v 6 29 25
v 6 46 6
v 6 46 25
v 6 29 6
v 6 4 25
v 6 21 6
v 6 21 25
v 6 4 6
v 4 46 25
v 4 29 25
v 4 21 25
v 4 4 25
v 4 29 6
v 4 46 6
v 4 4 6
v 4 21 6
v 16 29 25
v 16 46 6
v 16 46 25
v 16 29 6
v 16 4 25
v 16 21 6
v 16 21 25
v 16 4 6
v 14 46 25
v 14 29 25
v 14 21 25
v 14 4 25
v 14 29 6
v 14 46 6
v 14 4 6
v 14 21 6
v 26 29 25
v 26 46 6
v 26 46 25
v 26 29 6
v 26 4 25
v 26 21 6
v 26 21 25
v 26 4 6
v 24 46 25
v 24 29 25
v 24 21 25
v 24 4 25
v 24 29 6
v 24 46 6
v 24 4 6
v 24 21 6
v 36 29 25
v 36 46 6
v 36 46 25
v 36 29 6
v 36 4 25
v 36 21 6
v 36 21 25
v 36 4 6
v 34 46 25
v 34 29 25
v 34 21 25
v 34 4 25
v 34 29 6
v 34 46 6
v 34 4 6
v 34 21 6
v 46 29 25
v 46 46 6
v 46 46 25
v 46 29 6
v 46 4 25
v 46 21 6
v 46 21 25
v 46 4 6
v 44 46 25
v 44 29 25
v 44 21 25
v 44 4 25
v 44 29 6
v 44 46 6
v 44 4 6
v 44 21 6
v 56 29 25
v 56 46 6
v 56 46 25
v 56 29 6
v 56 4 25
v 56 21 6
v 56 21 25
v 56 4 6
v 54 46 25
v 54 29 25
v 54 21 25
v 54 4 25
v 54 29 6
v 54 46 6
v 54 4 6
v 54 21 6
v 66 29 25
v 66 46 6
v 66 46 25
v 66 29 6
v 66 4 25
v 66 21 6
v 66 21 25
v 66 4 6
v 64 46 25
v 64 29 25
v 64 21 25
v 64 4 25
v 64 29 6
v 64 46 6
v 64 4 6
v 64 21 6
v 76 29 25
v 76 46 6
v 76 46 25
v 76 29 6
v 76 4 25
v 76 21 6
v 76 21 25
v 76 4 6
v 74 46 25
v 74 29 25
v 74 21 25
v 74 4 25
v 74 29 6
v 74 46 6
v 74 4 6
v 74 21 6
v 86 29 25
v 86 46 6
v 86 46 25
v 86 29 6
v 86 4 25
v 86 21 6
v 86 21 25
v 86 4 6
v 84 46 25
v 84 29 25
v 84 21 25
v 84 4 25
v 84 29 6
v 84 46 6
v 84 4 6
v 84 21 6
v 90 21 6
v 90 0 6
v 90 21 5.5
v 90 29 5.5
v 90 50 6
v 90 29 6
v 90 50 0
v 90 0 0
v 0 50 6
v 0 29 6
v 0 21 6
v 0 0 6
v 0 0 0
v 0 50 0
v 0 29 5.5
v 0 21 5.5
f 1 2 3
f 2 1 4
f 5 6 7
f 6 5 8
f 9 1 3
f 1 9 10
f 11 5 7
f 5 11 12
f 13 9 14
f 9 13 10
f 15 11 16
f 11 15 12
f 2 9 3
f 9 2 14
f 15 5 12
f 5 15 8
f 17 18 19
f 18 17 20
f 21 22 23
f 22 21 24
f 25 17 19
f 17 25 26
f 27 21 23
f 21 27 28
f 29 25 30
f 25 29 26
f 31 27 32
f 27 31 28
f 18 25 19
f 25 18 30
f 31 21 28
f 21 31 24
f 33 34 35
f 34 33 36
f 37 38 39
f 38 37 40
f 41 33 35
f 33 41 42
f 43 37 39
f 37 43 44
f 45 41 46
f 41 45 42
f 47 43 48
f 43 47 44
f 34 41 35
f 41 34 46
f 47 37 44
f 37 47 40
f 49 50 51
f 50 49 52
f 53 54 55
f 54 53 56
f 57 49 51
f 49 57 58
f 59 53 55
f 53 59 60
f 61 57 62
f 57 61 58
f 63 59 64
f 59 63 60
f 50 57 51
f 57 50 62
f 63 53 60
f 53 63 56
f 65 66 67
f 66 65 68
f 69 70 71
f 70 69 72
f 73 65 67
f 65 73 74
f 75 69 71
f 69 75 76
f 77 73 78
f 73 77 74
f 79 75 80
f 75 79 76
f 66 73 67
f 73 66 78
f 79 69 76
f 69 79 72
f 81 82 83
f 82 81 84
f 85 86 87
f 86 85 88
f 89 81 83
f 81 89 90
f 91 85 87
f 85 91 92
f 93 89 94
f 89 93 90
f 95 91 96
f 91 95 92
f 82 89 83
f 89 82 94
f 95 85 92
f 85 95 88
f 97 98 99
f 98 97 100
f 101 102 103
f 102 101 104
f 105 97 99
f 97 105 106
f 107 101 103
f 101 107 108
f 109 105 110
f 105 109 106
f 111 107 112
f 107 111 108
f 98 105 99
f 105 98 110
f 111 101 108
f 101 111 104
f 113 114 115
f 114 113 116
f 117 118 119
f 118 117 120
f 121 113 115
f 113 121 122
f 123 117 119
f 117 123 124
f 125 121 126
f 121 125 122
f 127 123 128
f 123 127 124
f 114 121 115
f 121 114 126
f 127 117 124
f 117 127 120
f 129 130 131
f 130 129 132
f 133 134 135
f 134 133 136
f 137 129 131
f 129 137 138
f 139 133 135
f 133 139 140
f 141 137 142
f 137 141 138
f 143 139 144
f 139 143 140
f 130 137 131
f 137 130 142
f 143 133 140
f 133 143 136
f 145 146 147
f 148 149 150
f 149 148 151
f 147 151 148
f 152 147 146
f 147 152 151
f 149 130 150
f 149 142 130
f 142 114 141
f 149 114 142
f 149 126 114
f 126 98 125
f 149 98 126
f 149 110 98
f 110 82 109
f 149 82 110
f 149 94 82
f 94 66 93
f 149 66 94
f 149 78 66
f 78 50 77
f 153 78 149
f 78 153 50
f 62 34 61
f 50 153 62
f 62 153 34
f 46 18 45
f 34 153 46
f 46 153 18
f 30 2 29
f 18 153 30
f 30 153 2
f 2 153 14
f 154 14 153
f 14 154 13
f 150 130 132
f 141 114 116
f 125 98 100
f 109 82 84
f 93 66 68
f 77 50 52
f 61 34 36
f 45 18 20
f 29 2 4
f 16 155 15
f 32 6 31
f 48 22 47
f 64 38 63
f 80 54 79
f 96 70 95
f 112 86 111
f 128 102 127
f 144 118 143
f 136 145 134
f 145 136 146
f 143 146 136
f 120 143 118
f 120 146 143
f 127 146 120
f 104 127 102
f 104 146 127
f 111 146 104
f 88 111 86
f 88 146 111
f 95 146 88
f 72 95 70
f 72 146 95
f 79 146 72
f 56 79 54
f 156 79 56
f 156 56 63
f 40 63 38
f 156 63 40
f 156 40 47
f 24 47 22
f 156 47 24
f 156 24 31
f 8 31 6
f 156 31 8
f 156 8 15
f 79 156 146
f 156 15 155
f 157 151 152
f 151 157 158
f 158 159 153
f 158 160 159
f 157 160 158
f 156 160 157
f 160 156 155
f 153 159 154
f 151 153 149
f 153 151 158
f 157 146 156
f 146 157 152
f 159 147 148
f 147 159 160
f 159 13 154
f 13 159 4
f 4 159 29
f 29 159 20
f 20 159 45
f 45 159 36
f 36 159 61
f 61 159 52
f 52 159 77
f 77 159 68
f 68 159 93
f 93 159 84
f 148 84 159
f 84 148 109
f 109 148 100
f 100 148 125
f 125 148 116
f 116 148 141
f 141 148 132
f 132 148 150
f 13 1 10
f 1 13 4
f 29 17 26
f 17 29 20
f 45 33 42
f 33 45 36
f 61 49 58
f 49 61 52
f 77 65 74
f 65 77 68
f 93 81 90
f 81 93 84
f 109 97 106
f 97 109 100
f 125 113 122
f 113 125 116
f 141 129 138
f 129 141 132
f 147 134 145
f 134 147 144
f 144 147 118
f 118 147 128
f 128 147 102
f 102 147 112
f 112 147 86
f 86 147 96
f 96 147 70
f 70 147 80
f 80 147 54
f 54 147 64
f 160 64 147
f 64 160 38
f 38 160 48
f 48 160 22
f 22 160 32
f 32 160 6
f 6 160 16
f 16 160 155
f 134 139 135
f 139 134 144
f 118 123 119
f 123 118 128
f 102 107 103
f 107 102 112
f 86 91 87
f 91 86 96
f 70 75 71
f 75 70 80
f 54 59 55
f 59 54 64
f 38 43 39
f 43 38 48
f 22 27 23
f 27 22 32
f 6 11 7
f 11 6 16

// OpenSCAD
$fn = 32;

// ----------------------------------------------------------------------
// Heatsink: slotted fin block
// ----------------------------------------------------------------------

// --- parameters (mm) ---
base_l = 90;              // base length, X
base_w = 50;              // base width, Y
base_t = 6;               // base plate thickness
fin_h = 20;               // fin height above the base
fin_t = 2;                // fin thickness
edge = 4;                 // margin from the base ends
pitch = 10;               // fin pitch
slot_w = 8;               // central slot width, Y

n_fins = floor((base_l - 2 * edge - fin_t) / pitch) + 1;  // fin count
total_h = base_t + fin_h - 1;  // overall height

difference() {
union() {
  cube([base_l, base_w, base_t]);
  for (i = [0 : n_fins - 1])
    translate([edge + i * pitch, edge, base_t - 1])
      cube([fin_t, base_w - 2 * edge, fin_h]);
}
  translate([-1, base_w / 2 - slot_w / 2, base_t - 0.5])
    cube([base_l + 2, slot_w, fin_h + 2]);
}
